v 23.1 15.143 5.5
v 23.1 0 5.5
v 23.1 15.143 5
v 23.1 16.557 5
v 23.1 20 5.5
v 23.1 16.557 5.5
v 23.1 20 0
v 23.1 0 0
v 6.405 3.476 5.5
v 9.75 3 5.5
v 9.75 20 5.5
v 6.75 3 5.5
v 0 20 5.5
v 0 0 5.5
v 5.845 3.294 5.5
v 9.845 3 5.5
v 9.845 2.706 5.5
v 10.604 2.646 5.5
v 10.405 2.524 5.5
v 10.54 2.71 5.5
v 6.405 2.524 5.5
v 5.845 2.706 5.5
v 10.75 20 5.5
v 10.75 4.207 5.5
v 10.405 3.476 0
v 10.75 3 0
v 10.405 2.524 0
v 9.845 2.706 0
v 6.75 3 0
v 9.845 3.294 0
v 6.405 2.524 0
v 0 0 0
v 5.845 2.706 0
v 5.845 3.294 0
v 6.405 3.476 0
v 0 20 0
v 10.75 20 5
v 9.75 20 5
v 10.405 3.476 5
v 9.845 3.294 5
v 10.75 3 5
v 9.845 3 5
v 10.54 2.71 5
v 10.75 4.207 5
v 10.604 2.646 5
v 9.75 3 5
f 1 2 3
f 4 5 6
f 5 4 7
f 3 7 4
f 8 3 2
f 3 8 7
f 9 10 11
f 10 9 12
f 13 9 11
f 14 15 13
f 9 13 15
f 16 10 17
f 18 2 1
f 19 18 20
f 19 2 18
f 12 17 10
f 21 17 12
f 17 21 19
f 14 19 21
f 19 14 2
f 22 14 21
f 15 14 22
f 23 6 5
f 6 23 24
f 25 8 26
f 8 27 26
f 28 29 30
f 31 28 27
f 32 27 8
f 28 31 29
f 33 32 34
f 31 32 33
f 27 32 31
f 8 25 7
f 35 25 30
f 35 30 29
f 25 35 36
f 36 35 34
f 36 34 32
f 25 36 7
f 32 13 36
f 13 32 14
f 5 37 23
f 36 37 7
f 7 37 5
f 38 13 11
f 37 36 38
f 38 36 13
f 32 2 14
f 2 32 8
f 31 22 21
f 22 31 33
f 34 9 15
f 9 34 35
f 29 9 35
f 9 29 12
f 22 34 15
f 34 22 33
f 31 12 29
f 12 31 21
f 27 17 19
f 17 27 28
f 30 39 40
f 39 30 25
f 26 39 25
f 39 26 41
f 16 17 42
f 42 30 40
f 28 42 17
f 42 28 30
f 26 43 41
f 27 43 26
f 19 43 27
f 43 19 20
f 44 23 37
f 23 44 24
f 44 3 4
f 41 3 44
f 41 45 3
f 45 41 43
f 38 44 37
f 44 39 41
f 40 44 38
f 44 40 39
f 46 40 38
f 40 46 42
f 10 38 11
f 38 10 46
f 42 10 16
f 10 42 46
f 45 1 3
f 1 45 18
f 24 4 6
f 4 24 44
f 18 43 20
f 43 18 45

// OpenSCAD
ecart   = 4;
hauteur = 5;
epais   = 1;
profondeur = 20;
largeur = 16.5;


difference() {
    cube([largeur*1.4,profondeur,hauteur+epais/2]);
    translate([largeur/2-ecart/2,3,0]) cylinder(10,0.5,0.5);
    translate([largeur/2+ecart/2,3,0]) cylinder(10,0.5,0.5);
    translate([largeur/2+ecart/2-epais/2,3,hauteur]) cube([epais,profondeur,epais]);
    translate([largeur/2+ecart/2,3,hauteur]) 
    rotate([0,0,-45])
    translate([-epais/2,0,0])
    cube([epais,profondeur,epais]);
}

/*

pi    = 3.14;
anode = 25;
ecart = 16.5;
marge = 3;
rayon = (marge+anode-ecart)/pi;
diam  = 2*rayon;
echo(diam);

$fn = 100;

//negatif();
//positif();
//fil();

module negatif() {
    difference() {
        cube([ecart-marge+2*rayon+2,6,10]);
        translate([0,4,0])
        rotate([0,0,10])
        cube([ecart-marge+2*rayon+2,6,10]);
        positif();
        fil();
    }
}

module fil() {
    translate([0,0,5-epais/2])
    union() {
        translate([0,2-epais/2,0])
        cube([ecart-marge,epais,epais]);
        
        translate([rayon-marge+ecart,2-epais/2,0])
        difference() {
            cylinder(epais,rayon+epais/2,rayon+epais/2);
            cylinder(epais,rayon-epais/2,rayon-epais/2);
            translate([0,-ecart/2,0]) cube([ecart,ecart,ecart],center=true);
            }
            
       translate([ecart-marge+2*rayon-epais/2,0,0])
       cube([epais,2-epais/2,epais]);
    }
}

module positif(){
    difference() {
union() {
cube([ecart-marge+2*rayon-epais/8,2,10]);
translate([rayon-marge+ecart,2,0])
difference() {
    translate([0,-epais/2,0])
cylinder(10,rayon,rayon);
translate([0,-ecart/2,ecart/2]) cube([ecart,ecart,ecart],center=true);
}
}
fil();
}
}
*/
